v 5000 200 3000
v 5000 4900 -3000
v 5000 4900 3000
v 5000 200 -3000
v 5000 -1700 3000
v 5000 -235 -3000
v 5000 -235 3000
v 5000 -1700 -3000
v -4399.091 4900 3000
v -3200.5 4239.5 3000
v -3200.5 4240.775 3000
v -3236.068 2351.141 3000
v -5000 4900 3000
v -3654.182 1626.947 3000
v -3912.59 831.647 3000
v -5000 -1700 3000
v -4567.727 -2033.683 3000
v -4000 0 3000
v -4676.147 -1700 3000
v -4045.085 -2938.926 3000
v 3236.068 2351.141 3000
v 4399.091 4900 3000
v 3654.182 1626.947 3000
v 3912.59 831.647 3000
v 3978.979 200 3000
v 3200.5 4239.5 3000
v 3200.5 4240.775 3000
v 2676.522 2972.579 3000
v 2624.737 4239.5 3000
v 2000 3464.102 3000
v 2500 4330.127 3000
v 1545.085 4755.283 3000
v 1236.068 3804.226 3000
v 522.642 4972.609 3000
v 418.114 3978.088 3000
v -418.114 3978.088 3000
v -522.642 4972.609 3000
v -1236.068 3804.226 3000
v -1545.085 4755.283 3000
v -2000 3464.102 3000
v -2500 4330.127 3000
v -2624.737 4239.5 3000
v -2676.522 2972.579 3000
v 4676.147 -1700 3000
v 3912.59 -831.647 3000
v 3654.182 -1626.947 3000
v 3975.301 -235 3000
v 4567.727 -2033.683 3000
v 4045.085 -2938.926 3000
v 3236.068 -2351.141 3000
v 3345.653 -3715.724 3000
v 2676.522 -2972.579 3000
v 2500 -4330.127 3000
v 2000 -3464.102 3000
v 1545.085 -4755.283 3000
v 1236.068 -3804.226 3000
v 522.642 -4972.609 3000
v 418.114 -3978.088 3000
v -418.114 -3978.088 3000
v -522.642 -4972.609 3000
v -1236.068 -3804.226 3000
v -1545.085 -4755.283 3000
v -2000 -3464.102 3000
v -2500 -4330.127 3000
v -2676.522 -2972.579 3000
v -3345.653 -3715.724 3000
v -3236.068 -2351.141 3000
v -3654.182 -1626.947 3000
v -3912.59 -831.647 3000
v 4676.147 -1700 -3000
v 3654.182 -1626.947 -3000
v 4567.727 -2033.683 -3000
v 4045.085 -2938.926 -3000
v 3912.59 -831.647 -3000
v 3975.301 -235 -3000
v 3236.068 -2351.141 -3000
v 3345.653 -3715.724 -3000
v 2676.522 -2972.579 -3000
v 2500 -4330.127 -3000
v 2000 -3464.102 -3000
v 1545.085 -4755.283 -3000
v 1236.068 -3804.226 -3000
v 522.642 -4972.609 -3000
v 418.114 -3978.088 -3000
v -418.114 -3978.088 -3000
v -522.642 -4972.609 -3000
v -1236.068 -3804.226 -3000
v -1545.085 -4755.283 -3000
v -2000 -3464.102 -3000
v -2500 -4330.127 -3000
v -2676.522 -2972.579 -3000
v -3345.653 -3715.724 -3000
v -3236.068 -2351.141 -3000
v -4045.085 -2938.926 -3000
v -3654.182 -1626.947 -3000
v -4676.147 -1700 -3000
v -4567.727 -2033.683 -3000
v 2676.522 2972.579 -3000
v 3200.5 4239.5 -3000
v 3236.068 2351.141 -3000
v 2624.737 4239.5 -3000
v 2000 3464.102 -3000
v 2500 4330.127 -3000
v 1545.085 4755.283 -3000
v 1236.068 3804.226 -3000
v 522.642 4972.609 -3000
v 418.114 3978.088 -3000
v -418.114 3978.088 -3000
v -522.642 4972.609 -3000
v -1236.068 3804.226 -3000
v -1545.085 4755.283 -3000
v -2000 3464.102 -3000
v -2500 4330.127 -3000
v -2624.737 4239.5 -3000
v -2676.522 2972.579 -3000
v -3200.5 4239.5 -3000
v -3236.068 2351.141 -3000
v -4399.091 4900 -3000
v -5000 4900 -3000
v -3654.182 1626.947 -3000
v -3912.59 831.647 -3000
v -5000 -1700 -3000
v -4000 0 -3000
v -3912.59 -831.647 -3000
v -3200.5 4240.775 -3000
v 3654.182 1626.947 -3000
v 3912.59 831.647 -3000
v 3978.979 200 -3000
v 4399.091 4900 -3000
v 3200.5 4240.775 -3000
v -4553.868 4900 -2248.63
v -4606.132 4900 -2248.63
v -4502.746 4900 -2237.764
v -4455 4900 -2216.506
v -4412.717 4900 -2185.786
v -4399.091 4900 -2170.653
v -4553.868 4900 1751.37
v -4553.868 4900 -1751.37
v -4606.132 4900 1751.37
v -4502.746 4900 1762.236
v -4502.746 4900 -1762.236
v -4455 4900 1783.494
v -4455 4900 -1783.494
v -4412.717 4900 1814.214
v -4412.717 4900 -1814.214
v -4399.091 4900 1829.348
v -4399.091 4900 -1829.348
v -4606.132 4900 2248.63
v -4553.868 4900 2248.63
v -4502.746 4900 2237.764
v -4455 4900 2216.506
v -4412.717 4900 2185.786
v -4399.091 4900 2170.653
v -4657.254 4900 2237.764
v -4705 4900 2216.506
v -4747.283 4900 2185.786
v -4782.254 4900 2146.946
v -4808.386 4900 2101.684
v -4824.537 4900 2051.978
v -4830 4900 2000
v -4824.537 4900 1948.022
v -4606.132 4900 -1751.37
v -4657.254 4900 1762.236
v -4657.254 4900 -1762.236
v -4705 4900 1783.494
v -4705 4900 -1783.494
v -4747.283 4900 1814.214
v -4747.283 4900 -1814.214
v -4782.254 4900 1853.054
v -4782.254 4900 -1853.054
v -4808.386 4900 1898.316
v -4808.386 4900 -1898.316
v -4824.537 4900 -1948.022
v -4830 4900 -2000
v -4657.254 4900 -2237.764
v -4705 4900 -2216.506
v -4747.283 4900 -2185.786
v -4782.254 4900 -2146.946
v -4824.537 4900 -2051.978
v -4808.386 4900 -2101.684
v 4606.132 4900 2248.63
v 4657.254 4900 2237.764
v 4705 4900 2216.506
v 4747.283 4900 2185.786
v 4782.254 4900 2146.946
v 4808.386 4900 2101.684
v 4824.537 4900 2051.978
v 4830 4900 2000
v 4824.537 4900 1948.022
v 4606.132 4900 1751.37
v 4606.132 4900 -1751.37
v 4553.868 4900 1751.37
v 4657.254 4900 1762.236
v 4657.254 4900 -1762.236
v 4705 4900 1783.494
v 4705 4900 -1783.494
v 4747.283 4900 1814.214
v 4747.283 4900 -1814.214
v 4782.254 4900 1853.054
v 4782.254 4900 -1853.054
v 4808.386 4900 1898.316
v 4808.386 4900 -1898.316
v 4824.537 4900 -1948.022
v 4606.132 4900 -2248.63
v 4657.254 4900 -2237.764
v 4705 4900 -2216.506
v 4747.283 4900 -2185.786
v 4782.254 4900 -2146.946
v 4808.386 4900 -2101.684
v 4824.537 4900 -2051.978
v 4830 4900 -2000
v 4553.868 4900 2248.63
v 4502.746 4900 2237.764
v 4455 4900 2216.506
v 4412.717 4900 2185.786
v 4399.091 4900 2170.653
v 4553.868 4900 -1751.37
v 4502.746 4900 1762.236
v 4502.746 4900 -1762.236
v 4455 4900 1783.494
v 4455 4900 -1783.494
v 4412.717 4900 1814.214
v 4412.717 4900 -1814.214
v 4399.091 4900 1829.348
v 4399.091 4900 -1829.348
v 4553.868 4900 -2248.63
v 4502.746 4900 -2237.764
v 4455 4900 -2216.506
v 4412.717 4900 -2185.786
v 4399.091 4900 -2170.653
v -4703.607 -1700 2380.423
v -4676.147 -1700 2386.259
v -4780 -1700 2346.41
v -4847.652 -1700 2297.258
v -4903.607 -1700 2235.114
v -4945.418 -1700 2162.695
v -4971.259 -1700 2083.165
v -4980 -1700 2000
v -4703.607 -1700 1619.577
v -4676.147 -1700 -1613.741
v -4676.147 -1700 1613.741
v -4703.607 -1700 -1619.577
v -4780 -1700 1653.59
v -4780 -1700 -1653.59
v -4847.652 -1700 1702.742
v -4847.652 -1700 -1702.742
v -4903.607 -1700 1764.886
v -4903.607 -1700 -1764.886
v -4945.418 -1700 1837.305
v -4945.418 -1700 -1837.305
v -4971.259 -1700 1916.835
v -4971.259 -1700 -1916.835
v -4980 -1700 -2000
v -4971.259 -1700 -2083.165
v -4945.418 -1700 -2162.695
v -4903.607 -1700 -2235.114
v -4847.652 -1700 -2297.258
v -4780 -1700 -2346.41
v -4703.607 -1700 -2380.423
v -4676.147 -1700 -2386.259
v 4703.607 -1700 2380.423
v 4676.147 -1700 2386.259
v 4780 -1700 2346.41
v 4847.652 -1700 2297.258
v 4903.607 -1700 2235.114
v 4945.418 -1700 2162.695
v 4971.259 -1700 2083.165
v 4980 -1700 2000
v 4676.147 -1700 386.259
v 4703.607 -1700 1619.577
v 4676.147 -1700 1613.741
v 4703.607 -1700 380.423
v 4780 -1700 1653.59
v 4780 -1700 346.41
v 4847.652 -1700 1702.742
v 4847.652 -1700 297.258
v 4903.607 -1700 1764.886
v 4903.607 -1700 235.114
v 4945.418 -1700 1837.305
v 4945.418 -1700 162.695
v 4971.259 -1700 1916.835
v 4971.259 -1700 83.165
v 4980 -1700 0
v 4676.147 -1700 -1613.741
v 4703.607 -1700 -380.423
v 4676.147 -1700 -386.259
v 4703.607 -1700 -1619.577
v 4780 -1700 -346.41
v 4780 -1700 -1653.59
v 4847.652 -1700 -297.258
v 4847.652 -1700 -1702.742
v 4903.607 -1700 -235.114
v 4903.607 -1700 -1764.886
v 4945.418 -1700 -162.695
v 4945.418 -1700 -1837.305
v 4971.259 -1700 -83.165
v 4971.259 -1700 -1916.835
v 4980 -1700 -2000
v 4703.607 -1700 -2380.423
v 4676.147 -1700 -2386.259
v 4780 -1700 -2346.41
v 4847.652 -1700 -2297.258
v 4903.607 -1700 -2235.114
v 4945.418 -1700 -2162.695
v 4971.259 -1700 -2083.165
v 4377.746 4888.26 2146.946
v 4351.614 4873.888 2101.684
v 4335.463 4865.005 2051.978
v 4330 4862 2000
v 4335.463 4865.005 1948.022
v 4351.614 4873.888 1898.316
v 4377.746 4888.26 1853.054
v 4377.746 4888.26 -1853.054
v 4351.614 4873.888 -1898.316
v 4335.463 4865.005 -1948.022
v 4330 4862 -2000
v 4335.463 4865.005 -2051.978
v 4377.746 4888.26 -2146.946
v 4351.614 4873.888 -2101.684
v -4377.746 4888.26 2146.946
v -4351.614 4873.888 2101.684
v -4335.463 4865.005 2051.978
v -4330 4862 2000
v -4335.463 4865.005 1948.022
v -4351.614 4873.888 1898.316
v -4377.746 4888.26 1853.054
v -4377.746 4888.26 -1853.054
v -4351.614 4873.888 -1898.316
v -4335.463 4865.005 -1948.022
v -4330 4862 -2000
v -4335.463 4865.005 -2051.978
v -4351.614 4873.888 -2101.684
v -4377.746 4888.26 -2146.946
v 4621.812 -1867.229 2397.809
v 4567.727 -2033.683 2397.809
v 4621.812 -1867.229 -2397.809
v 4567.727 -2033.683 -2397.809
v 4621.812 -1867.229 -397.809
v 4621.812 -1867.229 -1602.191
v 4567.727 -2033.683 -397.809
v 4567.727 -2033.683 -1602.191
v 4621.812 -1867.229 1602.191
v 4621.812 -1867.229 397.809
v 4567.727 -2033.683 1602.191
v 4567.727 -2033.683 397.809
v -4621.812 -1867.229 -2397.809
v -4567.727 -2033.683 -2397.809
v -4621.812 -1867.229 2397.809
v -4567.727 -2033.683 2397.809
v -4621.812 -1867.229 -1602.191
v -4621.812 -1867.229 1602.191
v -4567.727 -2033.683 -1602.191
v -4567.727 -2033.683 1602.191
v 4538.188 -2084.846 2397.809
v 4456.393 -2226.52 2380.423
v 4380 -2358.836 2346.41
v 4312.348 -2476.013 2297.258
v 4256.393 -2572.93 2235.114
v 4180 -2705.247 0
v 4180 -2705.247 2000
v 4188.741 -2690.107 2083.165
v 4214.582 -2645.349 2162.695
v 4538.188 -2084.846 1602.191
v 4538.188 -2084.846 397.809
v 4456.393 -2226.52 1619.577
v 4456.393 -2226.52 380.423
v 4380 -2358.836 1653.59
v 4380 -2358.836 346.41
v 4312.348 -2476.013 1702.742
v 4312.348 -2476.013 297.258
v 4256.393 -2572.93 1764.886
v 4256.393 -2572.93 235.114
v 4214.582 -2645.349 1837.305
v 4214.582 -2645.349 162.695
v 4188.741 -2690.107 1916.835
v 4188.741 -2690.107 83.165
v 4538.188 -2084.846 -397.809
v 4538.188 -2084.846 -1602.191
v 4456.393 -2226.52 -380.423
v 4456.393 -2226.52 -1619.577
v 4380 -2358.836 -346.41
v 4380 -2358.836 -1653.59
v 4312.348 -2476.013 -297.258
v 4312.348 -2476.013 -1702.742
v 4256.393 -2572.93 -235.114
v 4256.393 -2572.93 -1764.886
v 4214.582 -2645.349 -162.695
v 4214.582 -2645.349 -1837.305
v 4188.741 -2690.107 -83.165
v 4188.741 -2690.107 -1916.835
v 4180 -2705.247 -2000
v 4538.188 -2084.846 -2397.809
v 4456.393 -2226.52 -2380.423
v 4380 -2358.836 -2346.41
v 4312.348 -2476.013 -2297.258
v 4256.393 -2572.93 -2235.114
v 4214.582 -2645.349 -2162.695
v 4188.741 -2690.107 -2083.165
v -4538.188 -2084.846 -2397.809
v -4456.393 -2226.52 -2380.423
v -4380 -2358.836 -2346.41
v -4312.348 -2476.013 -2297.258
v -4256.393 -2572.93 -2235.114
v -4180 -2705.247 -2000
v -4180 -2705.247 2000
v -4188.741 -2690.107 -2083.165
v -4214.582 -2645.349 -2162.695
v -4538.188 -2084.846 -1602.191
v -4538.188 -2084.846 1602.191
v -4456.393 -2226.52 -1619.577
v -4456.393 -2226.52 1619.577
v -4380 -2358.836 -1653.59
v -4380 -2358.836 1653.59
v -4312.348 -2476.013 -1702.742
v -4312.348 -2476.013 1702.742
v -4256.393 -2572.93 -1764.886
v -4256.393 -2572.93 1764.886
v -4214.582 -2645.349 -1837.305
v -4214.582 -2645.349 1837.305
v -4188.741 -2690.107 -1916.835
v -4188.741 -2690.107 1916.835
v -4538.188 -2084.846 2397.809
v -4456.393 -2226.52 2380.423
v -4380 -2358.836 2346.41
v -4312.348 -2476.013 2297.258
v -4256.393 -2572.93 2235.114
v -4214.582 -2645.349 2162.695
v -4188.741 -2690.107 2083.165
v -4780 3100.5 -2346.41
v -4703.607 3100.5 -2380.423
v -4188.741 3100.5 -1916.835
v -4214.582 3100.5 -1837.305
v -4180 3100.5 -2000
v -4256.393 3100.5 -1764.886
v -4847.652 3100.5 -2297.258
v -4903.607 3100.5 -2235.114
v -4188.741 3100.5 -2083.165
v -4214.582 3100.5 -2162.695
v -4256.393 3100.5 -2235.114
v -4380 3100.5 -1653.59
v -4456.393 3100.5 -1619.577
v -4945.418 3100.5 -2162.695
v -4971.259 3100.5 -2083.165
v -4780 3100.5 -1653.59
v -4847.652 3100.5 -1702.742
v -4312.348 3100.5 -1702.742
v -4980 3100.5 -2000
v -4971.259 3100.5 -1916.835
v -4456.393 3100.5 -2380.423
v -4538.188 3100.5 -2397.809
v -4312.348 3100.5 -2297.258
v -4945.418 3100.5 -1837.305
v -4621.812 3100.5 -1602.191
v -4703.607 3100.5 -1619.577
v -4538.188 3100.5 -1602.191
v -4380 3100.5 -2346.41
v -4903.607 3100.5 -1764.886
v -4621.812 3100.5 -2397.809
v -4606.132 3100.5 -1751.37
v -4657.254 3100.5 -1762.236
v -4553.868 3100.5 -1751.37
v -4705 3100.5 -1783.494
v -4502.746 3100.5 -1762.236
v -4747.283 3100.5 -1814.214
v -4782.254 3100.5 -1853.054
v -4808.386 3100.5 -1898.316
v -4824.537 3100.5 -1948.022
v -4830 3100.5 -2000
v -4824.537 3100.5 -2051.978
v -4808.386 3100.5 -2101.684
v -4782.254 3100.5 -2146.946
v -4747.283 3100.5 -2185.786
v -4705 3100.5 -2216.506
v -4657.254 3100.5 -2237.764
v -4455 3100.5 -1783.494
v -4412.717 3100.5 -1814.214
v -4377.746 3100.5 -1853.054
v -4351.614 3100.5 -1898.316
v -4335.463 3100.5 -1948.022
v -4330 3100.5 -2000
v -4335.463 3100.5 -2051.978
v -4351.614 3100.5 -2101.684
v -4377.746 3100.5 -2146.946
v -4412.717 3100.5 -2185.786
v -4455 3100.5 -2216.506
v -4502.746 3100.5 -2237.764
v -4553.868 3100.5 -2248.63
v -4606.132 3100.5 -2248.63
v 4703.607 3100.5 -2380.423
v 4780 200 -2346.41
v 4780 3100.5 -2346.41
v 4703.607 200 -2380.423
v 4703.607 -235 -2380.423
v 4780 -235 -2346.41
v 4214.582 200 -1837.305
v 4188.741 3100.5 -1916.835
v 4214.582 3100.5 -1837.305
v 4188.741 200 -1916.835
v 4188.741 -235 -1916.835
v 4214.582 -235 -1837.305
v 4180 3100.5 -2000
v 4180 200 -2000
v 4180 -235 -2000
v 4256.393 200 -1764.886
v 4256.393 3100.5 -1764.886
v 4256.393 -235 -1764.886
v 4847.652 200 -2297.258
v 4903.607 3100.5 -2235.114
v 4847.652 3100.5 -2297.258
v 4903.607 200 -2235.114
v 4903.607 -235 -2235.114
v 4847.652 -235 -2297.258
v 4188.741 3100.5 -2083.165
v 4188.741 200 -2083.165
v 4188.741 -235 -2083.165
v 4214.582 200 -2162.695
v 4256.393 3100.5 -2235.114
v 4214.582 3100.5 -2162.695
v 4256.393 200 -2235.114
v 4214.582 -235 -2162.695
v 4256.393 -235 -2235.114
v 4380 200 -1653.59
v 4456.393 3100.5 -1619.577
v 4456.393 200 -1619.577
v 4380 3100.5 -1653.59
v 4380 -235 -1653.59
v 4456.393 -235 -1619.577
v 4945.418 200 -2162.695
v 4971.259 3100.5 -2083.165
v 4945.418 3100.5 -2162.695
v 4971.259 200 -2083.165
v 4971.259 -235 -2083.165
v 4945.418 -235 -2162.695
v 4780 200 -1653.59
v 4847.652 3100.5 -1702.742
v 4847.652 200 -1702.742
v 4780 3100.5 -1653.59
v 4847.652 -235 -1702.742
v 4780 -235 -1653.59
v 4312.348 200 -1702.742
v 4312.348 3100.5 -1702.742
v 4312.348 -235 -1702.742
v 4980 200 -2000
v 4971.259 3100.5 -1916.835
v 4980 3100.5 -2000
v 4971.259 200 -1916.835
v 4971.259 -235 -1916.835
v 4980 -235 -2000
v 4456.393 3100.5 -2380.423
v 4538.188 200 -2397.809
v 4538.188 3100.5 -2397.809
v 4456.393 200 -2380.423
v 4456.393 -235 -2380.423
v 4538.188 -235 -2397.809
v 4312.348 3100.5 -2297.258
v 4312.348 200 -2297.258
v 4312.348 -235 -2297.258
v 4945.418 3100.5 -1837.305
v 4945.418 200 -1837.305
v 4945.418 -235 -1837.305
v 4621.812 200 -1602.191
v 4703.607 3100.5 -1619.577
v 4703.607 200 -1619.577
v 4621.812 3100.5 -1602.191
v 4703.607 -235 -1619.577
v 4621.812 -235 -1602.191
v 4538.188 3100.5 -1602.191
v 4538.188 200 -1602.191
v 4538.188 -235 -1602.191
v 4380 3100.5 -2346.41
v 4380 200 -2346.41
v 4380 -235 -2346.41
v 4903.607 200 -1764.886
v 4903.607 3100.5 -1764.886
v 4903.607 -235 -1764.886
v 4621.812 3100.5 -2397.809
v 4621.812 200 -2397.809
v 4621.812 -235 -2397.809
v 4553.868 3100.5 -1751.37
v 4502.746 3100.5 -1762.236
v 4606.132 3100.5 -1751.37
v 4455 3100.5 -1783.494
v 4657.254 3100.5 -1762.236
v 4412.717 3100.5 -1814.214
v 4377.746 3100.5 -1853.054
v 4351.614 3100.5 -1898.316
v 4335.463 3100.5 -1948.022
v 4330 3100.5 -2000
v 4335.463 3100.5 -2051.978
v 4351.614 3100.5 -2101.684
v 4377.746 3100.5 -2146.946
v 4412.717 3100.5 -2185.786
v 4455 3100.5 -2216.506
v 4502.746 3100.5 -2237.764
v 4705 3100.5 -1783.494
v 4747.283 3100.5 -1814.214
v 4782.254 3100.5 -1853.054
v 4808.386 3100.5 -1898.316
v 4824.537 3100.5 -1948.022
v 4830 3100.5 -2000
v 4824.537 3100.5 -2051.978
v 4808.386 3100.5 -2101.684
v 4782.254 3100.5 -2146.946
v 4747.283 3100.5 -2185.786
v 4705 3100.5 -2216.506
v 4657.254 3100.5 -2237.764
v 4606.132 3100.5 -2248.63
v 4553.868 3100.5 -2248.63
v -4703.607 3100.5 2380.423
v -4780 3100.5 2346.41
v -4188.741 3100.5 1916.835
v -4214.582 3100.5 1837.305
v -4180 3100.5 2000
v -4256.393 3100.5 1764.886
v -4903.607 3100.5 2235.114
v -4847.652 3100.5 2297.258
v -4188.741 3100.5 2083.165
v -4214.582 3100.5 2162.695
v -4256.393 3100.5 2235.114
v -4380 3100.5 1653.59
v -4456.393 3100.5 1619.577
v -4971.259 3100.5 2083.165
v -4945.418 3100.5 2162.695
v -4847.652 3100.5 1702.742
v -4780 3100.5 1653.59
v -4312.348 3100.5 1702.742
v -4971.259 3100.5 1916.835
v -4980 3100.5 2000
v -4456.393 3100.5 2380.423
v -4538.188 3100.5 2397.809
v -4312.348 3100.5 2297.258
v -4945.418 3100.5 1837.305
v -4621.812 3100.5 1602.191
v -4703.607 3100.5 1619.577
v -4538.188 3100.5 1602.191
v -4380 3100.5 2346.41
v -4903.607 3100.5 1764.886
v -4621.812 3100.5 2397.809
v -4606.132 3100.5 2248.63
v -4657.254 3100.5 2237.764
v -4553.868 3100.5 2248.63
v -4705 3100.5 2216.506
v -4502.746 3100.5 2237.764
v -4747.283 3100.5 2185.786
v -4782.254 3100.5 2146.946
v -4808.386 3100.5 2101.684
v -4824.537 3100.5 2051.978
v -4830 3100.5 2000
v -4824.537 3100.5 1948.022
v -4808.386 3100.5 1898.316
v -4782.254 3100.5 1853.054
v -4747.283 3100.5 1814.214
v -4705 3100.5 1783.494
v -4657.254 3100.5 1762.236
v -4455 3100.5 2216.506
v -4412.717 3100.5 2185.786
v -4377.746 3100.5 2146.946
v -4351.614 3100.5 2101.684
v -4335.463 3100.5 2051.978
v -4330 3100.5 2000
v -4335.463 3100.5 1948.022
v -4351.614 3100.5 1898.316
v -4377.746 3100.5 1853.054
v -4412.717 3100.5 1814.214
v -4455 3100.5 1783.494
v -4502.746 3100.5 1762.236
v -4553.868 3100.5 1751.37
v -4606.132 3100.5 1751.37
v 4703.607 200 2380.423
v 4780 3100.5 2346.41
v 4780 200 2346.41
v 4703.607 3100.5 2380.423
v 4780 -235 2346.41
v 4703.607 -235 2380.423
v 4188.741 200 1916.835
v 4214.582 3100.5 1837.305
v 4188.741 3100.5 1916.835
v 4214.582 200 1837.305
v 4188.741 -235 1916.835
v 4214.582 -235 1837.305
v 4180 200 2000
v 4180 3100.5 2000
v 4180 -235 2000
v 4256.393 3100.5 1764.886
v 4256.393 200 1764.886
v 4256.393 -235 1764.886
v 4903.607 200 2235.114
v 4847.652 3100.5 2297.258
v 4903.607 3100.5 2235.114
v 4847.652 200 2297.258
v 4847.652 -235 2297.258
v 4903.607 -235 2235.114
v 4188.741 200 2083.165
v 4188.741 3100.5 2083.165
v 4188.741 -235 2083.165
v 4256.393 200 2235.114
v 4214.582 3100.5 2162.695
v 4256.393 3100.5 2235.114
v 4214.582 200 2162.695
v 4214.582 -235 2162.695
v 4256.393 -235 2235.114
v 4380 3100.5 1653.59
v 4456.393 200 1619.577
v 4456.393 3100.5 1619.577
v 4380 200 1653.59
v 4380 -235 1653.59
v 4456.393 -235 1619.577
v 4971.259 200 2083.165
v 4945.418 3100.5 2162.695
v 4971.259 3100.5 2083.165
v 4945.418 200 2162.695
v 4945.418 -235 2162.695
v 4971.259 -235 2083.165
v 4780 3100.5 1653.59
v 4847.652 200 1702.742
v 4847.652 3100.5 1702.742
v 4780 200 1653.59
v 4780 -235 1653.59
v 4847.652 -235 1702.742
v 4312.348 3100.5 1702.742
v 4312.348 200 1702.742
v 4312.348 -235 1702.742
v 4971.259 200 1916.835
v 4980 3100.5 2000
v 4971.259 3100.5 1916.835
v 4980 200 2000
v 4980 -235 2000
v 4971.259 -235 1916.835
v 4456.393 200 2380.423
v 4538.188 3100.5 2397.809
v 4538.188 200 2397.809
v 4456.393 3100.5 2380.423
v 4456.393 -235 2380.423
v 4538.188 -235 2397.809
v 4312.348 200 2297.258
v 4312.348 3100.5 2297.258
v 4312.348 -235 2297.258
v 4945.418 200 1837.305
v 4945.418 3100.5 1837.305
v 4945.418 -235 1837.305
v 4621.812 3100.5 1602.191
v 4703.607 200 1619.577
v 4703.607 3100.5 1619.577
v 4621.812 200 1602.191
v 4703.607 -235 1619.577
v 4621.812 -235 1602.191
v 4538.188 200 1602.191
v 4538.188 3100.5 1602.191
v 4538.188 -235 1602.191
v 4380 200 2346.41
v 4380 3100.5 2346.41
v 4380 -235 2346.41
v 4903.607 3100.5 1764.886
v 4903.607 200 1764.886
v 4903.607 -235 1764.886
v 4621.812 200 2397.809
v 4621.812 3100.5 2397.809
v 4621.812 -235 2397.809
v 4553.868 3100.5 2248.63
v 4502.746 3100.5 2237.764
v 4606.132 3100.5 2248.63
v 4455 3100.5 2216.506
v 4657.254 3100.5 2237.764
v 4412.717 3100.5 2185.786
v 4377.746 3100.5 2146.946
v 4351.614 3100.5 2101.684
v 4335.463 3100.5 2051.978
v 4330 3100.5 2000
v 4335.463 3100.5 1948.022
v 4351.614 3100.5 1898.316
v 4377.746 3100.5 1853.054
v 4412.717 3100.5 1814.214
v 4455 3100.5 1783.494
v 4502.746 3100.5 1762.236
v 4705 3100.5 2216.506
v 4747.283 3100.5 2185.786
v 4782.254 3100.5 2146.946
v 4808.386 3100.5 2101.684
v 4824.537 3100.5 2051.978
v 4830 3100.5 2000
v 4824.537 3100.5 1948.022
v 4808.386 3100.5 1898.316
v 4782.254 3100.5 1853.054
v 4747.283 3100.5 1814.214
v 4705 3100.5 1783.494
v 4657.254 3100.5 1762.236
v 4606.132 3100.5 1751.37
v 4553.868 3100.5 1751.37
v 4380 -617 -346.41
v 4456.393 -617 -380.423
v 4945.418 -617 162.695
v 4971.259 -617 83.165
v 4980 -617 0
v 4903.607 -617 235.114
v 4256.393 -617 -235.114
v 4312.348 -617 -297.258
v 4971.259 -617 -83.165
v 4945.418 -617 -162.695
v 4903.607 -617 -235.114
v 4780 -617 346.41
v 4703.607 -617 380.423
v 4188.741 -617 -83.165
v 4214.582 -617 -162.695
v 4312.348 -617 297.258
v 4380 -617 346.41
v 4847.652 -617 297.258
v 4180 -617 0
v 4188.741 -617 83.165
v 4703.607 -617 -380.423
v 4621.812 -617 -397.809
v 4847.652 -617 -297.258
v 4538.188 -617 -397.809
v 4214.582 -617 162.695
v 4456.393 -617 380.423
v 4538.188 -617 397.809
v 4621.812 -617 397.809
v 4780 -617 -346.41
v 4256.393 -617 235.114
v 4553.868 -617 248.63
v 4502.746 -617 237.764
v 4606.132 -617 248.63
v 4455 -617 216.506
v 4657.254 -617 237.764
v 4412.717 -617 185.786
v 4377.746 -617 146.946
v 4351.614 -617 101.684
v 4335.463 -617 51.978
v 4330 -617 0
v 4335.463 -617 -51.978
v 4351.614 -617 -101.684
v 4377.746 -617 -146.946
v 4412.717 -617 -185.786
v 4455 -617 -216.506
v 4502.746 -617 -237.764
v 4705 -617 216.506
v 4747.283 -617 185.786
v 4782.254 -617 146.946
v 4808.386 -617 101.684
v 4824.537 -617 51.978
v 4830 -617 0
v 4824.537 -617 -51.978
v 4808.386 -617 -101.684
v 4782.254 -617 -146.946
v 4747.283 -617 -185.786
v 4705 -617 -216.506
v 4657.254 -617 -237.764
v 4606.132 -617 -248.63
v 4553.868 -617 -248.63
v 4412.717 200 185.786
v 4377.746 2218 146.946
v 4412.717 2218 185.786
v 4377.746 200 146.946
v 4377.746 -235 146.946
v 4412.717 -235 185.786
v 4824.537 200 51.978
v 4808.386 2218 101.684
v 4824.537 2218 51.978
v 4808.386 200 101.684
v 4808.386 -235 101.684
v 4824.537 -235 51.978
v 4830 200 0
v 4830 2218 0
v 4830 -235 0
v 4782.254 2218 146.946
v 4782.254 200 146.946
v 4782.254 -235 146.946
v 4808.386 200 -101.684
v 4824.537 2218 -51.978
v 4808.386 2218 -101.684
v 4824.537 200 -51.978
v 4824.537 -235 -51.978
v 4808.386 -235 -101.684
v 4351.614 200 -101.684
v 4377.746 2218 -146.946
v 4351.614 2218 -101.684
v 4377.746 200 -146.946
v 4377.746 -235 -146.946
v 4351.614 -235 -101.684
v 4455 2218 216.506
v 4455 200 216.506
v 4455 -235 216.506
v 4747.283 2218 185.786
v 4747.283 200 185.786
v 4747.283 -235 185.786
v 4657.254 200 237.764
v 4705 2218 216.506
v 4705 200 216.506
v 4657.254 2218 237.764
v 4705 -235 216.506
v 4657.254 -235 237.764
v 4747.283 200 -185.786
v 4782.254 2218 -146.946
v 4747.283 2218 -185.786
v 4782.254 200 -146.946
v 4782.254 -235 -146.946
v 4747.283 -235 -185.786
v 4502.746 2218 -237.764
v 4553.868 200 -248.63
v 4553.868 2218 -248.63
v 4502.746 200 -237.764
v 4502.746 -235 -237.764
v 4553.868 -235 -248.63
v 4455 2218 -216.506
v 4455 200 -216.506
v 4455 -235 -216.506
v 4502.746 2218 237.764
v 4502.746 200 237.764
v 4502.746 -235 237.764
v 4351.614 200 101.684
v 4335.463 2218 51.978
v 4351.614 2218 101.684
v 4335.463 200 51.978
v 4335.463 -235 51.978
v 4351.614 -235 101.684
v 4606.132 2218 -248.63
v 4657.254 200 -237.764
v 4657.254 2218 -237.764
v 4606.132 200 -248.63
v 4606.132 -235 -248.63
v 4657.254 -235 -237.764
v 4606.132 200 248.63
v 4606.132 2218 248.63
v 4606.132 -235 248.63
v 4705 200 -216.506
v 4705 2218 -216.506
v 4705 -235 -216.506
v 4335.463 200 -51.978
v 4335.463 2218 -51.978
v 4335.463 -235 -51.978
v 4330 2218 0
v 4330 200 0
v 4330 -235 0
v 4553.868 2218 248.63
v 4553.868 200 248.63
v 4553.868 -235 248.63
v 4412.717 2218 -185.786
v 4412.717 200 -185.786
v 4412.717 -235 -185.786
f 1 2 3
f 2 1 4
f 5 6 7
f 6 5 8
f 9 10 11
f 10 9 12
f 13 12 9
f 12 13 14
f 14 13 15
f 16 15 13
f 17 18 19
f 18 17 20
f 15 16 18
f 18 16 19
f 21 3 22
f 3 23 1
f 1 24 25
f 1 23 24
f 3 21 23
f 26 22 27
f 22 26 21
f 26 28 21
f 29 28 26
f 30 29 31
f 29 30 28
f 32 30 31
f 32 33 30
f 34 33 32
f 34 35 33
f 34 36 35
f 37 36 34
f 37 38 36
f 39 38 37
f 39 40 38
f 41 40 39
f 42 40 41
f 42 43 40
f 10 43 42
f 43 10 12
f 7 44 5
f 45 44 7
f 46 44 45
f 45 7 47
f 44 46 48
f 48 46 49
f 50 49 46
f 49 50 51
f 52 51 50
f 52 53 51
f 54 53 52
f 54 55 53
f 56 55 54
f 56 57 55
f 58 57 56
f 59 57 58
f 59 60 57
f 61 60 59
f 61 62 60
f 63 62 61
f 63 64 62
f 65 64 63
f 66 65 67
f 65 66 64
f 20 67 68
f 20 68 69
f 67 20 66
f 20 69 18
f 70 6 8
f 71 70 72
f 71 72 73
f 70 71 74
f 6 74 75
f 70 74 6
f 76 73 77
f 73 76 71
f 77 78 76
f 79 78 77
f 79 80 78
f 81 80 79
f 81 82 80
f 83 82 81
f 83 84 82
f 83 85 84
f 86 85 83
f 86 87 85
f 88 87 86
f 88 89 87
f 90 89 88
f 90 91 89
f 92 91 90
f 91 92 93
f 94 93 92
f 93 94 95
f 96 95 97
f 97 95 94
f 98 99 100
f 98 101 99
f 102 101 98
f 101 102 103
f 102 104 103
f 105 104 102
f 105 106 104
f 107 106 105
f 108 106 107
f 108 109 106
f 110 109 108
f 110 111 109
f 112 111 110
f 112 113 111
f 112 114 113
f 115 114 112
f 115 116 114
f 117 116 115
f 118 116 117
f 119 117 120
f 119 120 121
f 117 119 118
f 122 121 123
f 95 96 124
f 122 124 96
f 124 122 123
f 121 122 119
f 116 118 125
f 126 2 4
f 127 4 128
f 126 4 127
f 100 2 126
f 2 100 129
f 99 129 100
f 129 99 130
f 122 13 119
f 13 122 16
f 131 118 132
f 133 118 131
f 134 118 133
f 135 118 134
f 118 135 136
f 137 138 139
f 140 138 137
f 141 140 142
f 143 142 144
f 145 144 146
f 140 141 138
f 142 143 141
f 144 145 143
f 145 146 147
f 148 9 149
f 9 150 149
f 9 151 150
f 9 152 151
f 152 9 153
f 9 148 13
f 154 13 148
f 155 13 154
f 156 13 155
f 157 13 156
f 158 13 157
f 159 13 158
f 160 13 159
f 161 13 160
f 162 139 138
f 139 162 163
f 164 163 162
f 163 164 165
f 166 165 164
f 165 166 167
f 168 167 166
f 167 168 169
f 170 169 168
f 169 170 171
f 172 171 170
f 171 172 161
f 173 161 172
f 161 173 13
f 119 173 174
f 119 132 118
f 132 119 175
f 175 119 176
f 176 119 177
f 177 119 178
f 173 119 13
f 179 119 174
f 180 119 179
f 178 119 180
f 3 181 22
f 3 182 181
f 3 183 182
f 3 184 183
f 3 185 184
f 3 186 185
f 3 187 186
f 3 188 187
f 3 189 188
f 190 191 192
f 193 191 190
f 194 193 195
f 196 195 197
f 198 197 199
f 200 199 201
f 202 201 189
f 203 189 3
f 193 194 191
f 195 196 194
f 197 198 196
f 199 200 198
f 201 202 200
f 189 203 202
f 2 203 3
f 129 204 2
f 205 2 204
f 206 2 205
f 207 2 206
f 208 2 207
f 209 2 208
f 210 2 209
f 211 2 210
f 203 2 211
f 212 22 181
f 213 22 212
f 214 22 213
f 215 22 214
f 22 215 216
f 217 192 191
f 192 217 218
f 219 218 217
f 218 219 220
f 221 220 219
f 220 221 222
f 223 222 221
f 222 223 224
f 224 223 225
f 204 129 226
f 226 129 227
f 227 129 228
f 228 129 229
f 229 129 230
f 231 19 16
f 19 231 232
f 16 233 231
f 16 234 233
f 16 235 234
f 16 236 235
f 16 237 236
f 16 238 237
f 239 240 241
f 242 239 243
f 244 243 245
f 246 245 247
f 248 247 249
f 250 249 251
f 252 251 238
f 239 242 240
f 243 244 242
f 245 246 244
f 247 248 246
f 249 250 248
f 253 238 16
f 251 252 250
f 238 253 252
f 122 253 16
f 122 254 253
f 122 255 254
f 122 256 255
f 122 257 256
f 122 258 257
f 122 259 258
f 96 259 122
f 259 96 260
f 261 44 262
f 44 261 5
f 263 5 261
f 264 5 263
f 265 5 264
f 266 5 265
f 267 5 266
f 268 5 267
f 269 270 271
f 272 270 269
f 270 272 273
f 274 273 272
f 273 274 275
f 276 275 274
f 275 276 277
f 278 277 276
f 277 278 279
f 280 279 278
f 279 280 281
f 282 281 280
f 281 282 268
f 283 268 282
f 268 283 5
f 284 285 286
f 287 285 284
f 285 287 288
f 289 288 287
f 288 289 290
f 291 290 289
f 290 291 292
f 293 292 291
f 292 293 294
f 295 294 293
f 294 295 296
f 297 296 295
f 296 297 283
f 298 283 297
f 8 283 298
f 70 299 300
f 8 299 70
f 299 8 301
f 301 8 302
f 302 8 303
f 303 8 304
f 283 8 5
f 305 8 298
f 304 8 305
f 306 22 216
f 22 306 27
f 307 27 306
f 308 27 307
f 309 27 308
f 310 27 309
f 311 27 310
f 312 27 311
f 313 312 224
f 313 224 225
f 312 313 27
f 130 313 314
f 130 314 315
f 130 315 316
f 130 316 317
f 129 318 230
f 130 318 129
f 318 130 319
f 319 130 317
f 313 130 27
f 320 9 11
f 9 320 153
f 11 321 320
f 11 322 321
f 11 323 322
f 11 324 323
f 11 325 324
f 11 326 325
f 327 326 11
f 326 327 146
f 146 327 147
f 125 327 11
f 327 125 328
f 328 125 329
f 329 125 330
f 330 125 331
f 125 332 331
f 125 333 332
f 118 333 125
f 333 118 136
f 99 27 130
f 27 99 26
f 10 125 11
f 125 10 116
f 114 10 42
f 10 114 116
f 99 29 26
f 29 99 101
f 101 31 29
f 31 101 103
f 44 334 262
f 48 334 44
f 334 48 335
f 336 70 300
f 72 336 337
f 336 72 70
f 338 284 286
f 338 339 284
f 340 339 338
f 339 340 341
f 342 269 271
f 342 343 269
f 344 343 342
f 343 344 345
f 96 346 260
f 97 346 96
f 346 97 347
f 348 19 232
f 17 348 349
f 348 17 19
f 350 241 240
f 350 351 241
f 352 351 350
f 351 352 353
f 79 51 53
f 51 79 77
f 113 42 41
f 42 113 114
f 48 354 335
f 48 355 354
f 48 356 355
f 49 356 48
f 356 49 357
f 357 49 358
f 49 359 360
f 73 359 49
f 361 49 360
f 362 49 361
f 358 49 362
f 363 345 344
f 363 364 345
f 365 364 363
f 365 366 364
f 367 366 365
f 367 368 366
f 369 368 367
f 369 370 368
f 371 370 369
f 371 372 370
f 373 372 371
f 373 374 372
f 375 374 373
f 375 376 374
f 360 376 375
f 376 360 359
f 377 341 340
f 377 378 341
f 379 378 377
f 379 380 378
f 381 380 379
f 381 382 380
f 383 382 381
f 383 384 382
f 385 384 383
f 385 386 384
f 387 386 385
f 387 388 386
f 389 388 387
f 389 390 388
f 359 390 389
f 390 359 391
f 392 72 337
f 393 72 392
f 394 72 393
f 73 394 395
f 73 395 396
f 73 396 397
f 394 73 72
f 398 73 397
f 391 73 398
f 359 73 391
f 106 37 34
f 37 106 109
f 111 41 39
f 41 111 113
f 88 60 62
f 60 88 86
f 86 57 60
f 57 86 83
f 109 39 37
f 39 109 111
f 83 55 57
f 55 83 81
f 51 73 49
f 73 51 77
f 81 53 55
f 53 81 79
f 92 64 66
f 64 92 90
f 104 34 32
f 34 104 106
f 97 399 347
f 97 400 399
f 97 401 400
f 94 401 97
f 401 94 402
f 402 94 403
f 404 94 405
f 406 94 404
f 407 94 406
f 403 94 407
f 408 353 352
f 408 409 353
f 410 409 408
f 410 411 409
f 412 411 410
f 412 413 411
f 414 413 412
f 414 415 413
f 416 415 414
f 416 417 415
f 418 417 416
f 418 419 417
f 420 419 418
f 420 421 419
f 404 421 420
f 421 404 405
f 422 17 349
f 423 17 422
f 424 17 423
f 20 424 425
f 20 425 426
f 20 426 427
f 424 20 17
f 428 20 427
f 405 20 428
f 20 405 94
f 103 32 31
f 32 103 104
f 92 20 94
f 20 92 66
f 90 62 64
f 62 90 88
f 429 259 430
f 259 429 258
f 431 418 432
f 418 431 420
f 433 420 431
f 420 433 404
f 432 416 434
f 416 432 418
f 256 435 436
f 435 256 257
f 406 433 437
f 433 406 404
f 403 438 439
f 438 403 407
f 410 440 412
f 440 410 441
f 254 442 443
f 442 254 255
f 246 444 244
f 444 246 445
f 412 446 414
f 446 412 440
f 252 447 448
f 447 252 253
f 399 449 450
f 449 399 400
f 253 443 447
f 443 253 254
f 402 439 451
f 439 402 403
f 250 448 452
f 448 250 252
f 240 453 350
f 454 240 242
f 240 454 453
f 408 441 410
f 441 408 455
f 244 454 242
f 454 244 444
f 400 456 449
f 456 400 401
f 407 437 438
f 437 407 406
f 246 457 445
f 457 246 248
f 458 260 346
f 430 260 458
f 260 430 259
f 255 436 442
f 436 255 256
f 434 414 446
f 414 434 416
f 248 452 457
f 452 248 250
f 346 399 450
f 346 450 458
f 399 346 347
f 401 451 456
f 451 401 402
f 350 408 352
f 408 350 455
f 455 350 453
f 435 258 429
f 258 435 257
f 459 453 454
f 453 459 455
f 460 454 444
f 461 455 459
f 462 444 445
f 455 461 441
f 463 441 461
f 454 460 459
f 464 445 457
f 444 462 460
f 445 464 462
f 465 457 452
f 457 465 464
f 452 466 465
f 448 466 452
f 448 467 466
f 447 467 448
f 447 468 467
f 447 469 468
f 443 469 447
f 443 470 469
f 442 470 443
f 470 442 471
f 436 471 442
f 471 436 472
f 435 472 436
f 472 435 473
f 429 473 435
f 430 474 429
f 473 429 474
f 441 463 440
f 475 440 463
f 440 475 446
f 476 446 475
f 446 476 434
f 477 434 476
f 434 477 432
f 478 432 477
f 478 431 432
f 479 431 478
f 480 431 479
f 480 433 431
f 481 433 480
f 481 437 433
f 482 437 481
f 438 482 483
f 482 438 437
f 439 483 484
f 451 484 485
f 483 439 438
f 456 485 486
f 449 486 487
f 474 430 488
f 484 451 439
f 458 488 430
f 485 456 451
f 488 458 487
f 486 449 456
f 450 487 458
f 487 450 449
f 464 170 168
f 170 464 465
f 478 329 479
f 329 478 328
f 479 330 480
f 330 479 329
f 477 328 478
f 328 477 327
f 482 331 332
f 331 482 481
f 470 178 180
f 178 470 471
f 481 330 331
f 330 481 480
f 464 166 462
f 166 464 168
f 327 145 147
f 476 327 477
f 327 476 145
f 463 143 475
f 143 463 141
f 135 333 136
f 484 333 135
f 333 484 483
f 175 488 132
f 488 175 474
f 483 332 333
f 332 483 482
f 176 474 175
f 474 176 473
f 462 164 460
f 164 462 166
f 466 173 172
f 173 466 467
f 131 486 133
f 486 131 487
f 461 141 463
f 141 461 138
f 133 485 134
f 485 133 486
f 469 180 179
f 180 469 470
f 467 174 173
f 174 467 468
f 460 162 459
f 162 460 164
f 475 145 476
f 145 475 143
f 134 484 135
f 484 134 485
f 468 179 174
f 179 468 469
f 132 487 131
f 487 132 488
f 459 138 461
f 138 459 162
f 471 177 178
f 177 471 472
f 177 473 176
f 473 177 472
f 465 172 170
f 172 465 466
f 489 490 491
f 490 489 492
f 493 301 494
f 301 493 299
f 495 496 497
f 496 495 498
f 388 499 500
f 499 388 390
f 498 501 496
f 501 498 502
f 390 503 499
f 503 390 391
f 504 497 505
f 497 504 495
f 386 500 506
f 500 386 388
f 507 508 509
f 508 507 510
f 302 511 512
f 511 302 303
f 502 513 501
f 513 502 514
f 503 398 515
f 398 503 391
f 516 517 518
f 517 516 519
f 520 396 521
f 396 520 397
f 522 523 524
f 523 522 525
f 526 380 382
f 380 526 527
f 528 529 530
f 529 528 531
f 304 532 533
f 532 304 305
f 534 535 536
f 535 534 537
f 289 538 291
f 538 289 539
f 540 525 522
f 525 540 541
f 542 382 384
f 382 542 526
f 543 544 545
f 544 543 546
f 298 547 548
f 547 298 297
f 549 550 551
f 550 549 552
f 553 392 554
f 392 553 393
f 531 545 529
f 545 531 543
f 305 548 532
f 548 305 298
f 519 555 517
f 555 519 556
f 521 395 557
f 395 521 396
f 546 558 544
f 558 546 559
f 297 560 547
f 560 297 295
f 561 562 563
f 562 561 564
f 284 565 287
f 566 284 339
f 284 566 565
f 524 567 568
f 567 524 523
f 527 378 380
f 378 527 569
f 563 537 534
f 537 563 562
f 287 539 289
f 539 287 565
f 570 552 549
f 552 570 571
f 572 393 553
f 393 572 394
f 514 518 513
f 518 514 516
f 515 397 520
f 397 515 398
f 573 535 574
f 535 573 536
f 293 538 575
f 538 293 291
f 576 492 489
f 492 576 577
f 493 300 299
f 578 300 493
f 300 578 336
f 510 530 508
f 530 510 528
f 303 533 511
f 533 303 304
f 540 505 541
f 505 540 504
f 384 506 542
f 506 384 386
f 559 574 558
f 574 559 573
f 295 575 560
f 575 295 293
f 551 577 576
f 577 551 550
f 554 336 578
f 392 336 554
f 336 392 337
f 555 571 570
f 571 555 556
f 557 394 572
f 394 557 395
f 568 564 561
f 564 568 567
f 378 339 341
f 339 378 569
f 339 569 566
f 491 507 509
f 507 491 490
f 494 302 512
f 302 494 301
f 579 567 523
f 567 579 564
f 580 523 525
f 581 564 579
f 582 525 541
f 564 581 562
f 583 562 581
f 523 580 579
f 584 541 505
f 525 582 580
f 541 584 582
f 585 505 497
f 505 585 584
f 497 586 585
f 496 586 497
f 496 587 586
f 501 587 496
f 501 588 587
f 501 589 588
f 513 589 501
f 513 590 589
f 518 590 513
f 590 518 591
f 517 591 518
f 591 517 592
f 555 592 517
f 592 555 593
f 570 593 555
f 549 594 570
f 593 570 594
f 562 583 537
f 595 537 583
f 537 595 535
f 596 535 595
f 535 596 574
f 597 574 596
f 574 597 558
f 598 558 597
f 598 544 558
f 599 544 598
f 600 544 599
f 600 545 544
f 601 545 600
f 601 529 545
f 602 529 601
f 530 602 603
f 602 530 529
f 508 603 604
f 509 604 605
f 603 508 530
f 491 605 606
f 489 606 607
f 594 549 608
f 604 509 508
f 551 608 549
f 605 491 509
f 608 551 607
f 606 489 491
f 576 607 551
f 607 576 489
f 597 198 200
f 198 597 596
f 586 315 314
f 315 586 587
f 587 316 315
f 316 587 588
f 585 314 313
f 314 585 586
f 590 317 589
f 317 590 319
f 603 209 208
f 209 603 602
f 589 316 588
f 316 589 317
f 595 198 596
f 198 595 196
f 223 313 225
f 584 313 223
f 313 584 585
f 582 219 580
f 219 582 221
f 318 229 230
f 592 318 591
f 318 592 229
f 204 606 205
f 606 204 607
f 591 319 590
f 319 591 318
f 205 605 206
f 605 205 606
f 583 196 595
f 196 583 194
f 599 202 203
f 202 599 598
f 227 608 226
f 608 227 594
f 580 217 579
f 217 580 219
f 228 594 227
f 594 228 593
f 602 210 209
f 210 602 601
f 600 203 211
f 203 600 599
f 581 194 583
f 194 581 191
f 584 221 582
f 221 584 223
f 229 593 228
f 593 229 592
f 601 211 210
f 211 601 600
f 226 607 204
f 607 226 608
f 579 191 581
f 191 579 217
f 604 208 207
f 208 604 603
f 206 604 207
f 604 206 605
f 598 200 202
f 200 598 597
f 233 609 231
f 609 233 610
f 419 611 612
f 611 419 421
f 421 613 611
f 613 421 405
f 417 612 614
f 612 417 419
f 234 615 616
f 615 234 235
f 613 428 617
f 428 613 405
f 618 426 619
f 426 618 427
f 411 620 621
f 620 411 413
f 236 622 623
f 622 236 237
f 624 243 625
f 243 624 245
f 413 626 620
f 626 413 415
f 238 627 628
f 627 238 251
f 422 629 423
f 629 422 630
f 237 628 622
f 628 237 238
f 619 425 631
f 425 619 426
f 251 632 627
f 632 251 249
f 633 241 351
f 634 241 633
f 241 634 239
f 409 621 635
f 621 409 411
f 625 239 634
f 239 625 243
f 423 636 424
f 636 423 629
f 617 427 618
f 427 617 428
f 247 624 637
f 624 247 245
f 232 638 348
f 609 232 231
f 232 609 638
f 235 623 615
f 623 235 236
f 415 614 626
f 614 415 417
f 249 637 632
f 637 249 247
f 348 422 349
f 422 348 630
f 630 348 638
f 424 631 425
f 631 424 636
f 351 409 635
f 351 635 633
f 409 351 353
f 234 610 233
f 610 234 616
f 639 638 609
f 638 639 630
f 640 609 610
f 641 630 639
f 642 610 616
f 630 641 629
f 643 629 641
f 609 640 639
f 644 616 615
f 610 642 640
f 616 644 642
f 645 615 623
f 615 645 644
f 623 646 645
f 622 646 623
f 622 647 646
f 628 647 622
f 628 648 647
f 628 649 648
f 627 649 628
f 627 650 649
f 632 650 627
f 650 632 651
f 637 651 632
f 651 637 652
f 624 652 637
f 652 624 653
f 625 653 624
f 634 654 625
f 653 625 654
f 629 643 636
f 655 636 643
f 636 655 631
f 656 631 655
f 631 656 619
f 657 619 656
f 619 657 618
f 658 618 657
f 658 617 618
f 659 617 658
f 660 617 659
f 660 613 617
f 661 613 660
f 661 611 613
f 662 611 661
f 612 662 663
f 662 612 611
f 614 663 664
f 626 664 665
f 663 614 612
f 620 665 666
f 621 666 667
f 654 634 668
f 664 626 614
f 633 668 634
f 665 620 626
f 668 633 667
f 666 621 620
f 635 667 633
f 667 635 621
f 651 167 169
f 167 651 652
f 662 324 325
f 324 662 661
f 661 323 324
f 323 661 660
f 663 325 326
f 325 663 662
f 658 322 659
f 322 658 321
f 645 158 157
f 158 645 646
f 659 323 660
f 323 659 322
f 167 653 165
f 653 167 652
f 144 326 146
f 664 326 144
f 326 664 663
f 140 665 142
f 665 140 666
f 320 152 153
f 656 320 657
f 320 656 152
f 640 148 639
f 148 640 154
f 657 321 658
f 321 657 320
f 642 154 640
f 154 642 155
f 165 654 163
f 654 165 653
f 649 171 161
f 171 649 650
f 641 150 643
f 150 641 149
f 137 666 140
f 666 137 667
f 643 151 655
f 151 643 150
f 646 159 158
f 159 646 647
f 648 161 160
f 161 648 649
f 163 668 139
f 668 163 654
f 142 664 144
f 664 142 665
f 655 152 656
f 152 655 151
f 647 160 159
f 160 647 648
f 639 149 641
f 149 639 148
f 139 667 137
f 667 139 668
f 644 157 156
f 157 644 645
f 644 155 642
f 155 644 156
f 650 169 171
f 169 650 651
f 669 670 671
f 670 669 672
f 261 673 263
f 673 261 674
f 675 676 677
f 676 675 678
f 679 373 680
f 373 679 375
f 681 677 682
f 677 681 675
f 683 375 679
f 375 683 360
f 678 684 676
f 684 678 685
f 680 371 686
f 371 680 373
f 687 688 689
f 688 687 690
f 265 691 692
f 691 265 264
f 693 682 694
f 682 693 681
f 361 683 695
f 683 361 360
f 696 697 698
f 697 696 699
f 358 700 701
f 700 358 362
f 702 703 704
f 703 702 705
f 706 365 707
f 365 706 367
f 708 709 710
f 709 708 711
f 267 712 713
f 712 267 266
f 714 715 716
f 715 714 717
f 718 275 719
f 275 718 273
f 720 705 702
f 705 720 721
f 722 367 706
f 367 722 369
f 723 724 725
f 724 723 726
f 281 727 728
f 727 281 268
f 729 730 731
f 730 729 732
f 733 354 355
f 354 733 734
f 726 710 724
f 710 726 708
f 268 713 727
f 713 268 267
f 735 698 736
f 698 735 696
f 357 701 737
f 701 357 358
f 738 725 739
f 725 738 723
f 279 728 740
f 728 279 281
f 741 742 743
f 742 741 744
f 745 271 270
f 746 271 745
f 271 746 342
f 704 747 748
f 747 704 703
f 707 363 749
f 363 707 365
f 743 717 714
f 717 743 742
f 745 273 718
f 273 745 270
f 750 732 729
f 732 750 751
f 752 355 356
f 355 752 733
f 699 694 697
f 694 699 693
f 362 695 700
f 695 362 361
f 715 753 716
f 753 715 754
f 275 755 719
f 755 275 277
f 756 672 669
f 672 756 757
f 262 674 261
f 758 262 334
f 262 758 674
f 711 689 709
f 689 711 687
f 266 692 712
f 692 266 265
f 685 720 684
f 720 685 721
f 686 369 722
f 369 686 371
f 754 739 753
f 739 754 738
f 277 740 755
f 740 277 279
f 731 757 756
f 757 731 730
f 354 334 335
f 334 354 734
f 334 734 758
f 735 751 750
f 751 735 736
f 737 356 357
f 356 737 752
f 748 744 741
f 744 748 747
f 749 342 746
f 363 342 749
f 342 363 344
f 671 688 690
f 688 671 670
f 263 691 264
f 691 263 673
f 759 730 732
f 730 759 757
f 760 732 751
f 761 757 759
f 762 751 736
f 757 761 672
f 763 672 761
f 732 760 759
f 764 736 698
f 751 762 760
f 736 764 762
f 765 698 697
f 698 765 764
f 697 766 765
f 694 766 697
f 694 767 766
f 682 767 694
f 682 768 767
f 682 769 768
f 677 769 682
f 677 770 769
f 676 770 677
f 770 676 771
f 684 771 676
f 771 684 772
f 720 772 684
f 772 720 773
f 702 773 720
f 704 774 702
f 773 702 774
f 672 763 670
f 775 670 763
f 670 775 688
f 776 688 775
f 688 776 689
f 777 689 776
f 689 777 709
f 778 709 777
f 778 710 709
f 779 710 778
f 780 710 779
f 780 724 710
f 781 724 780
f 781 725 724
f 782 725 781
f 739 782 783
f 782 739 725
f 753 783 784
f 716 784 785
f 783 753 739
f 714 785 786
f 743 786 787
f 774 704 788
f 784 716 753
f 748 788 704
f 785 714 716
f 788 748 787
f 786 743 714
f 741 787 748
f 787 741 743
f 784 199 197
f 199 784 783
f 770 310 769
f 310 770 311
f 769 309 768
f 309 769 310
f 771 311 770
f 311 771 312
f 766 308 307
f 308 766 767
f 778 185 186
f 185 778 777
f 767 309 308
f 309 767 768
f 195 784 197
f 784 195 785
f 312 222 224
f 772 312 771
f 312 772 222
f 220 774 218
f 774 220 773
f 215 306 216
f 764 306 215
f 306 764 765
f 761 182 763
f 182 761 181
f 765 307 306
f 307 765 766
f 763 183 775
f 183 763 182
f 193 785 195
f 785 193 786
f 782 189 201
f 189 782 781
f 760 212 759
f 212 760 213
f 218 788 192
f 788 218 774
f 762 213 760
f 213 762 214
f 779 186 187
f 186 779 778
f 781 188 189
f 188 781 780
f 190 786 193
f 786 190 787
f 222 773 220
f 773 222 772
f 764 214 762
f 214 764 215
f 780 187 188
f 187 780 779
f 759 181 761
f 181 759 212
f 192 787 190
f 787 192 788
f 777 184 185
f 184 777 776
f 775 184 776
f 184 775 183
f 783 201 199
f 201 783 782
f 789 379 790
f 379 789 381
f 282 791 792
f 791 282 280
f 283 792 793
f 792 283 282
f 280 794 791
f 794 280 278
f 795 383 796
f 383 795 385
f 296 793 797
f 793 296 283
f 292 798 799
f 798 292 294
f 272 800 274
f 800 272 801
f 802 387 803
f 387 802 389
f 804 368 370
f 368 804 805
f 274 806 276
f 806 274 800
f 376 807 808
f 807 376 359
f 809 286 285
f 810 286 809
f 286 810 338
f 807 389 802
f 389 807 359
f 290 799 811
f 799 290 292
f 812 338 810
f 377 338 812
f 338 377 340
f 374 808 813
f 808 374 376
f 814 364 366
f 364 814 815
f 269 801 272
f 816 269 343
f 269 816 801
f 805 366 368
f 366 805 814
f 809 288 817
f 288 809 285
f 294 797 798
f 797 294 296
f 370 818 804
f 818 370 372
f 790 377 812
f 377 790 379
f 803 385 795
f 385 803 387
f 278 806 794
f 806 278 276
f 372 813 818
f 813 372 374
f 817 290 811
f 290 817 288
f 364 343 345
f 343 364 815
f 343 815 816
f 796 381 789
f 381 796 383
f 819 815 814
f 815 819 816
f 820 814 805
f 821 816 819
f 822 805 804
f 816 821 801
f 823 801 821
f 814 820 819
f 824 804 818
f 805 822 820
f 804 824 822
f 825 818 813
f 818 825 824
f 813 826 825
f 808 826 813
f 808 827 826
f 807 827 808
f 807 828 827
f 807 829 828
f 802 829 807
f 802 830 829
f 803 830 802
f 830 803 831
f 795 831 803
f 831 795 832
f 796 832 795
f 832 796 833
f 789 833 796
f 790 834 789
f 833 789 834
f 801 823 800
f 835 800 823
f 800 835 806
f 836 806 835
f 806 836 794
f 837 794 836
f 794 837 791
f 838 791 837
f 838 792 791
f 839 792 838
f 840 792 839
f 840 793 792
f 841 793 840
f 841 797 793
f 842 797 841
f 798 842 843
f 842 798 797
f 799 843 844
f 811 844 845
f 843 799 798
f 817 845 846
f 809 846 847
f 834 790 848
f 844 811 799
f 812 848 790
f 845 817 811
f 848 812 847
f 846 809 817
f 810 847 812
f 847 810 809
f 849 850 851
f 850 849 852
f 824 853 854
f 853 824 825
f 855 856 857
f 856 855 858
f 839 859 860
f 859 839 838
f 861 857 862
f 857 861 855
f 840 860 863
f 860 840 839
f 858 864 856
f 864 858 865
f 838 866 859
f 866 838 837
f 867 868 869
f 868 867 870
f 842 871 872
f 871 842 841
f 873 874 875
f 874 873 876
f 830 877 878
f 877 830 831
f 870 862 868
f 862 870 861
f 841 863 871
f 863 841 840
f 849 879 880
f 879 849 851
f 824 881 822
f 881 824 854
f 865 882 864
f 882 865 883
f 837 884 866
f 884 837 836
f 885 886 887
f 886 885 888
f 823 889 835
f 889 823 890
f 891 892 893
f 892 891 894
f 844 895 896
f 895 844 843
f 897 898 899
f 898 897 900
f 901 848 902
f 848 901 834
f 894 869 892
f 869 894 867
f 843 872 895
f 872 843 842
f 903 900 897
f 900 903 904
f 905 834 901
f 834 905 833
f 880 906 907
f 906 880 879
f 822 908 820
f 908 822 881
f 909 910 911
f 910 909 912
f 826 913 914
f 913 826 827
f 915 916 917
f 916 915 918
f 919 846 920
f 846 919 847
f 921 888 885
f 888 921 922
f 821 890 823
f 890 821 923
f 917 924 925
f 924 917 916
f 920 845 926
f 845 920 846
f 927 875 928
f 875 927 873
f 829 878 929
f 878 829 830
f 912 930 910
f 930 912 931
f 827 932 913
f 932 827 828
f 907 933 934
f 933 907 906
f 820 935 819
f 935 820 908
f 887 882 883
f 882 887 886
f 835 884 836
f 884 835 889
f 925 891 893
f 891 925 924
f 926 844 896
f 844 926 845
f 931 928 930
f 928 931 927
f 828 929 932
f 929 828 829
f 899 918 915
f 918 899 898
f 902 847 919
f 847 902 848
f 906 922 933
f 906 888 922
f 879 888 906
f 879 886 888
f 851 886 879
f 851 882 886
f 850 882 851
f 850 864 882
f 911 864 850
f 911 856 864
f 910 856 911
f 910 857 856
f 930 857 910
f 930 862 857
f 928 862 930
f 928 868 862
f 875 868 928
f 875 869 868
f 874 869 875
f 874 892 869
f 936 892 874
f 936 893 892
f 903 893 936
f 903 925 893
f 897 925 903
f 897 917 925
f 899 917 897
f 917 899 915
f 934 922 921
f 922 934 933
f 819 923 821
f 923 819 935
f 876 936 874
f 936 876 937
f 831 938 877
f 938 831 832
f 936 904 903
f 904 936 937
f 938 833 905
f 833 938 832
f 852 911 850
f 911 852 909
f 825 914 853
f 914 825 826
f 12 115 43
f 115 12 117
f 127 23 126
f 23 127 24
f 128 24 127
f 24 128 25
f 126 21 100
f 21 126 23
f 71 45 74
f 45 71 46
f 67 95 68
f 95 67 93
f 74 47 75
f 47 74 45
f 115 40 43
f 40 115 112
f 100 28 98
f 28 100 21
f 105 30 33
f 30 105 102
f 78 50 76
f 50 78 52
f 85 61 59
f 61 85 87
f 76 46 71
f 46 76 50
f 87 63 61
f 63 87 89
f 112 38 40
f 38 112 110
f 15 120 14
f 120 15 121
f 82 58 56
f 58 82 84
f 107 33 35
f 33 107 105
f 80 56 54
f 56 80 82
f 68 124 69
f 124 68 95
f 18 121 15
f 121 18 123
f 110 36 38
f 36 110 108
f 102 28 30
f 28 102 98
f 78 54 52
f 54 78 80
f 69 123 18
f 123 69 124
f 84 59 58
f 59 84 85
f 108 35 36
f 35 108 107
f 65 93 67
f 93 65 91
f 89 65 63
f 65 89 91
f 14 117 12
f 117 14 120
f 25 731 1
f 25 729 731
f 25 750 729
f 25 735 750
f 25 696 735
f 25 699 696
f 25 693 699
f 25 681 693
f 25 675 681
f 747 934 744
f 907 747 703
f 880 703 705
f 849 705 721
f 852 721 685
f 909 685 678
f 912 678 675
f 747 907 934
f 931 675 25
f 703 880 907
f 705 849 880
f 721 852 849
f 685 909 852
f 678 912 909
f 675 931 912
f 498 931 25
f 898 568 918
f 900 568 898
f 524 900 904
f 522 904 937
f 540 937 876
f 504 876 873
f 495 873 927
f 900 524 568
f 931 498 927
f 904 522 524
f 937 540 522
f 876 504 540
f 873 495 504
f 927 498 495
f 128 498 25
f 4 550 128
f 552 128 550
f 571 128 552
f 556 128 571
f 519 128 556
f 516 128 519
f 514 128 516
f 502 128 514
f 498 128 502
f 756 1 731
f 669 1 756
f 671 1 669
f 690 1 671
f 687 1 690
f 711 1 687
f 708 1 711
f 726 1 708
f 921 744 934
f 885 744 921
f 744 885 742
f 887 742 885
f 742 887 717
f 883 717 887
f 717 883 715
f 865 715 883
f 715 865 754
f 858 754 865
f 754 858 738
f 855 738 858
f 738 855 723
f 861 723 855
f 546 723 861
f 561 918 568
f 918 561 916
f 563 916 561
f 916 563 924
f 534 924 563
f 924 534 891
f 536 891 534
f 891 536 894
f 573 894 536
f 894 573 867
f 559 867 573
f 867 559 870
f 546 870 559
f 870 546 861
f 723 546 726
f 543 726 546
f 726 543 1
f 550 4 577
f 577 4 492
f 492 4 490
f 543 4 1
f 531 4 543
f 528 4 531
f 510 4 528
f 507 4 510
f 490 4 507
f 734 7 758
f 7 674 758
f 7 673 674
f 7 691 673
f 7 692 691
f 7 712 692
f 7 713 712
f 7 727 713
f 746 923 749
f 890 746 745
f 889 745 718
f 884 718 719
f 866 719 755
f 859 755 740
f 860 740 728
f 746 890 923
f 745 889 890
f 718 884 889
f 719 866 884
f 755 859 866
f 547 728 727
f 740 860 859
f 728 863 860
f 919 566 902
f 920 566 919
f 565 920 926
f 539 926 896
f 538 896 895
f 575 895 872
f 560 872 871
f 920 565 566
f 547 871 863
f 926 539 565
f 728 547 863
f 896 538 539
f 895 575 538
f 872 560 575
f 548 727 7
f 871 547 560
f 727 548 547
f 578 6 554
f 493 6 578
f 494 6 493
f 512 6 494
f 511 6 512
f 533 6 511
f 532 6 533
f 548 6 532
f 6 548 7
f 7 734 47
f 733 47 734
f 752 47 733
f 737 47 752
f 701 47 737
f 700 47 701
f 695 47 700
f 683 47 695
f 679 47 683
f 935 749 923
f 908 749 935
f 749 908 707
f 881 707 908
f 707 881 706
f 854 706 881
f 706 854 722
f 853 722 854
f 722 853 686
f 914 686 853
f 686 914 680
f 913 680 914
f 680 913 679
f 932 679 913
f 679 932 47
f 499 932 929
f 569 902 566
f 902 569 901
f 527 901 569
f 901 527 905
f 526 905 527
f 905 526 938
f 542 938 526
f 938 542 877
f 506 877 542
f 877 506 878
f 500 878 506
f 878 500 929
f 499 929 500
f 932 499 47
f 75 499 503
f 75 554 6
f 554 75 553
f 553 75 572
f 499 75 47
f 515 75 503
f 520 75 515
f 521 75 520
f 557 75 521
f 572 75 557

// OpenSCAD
// file: ../common/triangle.scad
module triangle(o_len, a_len, depth, center=false) {
  centroid = center ? [-a_len/3, -o_len/3, -depth/2] : [0, 0, 0];
  translate(centroid) linear_extrude(height=depth) {
    polygon(points=[[0,0],[a_len,0],[0,o_len]], paths=[[0,1,2]]);
  }
}
// file: ../common/holes.scad
module countersunk_hole(h, d, r_inner, r_outer, center=true) {
  centroid = center ? [0, 0, 0] : [r_outer, r_outer, h / 2];
  translate(centroid) {
    translate([0, 0, (h - d) / 2]) cylinder(r=r_outer, h=d + 1, center=true);
    cylinder(r=r_inner, h=h + 1, center=true);
  }
}

module circle_mount(r_mount, r_hole, h) {
  translate([0, r_mount, 0]) cylinder(r=r_hole, h=h + 1, center=true);
  translate([0, -r_mount, 0]) cylinder(r=r_hole, h=h + 1, center=true);
  translate([r_mount, 0, 0]) cylinder(r=r_hole, h=h + 1, center=true);
  translate([-r_mount, 0, 0]) cylinder(r=r_hole, h=h + 1, center=true);
}

module square_mount(r_mount, r_hole, h) {
  translate([r_mount, r_mount, 0]) cylinder(r=r_hole, h=h + 1, center=true);
  translate([r_mount, -r_mount, 0]) cylinder(r=r_hole, h=h + 1, center=true);
  translate([-r_mount, r_mount, 0]) cylinder(r=r_hole, h=h + 1, center=true);
  translate([-r_mount, -r_mount, 0]) cylinder(r=r_hole, h=h + 1, center=true);
}

module mirror_drilling(axis=[1, 0, 0]) {
  children();
  mirror(axis) children();
}

module quad_drilling(axis=[0, 0, 1]) {
  children();
  mirror([1, 0, 0]) children();
  mirror(axis) {
    children();
    mirror([1, 0, 0]) children();
  }
}
// main file
use <../common/holes.scad>;
use <../common/triangle.scad>;

module SpindleMount(height=6000, spindleDiameter=8000, center=false) {
  border = 1000;

  spindleRadius = spindleDiameter / 2;
  diameter = spindleDiameter + border * 2;
  radius = diameter / 2;
  squarePartLength = diameter * 0.66;
  extraLength = squarePartLength / 2 + 100;
  cutoutWidth = 435;
  cutoutLength = border * 2;
  drillingOffset = 170;

  centroid = center ? [0, 0, 0] : [radius, radius, height / 2];
  translate(centroid) difference() {
    union() {
      cylinder(r=radius, h=height, center=true);
      translate([0, radius - extraLength, 0]) {
        difference() {
          cube([diameter, squarePartLength, height], center=true);

          triangleA = spindleDiameter * 0.15;
          triangleO = spindleDiameter * 0.0825;
          triangleOffset = spindleDiameter * 0.075;

          triangleX = radius - triangleA - triangleOffset;
          triangleY = squarePartLength / 2 + 0.5;
          triangleZ = height / 2 + 0.5;
          translate([triangleX, triangleY, triangleZ]) rotate([0, 180, 180]) {
            triangle(o_len=triangleO, a_len=triangleA, depth=height + 1);
          }
          translate([-triangleX, triangleY, -triangleZ]) rotate([0, 0, 180]) {
            triangle(o_len=triangleO, a_len=triangleA, depth=height + 1);
          }
          translate([0, (squarePartLength - triangleO) / 2, 0]) {
            cube([diameter - triangleA * 2 - triangleOffset * 2 + 1, triangleO + 1, height + 1], center=true);
          }
        }
      }
    }
    cylinder(r=spindleRadius, h=height + 1, center=true);

    translate([radius - cutoutLength / 2 + 1, (diameter - cutoutWidth) / 2 + 100 - diameter * 0.49, 0]) {
      cube([cutoutLength, cutoutWidth, height + 1], center=true);
    }

    // Holes for mounting the spindle mount on the Z axis plate.
    quad_drilling() translate([250 + drillingOffset - radius, 8300 / 2 - extraLength, 1000 - height / 2]) {
      rotate([90, 0, 0]) countersunk_hole(h=8300, d=8300 - 1800, r_inner=250, r_outer=400);
    }

    // Hole for tightening the spindle mount.
    clampHoleBottomDepth = 2000;
    clampHoleDepth = 3000 + clampHoleBottomDepth;
    clampHoleScrewDepth = clampHoleDepth - 400 - cutoutWidth - clampHoleBottomDepth;
    clampHoleThread = 250;
    translate([radius - clampHoleThread - drillingOffset, clampHoleBottomDepth - (clampHoleDepth - cutoutWidth) / 2, 0]) {
      rotate([90, 0, 0]) countersunk_hole(h=clampHoleDepth, d=clampHoleScrewDepth, r_inner=clampHoleThread, r_outer=400);
    }
  }
}

SpindleMount(center=true);
